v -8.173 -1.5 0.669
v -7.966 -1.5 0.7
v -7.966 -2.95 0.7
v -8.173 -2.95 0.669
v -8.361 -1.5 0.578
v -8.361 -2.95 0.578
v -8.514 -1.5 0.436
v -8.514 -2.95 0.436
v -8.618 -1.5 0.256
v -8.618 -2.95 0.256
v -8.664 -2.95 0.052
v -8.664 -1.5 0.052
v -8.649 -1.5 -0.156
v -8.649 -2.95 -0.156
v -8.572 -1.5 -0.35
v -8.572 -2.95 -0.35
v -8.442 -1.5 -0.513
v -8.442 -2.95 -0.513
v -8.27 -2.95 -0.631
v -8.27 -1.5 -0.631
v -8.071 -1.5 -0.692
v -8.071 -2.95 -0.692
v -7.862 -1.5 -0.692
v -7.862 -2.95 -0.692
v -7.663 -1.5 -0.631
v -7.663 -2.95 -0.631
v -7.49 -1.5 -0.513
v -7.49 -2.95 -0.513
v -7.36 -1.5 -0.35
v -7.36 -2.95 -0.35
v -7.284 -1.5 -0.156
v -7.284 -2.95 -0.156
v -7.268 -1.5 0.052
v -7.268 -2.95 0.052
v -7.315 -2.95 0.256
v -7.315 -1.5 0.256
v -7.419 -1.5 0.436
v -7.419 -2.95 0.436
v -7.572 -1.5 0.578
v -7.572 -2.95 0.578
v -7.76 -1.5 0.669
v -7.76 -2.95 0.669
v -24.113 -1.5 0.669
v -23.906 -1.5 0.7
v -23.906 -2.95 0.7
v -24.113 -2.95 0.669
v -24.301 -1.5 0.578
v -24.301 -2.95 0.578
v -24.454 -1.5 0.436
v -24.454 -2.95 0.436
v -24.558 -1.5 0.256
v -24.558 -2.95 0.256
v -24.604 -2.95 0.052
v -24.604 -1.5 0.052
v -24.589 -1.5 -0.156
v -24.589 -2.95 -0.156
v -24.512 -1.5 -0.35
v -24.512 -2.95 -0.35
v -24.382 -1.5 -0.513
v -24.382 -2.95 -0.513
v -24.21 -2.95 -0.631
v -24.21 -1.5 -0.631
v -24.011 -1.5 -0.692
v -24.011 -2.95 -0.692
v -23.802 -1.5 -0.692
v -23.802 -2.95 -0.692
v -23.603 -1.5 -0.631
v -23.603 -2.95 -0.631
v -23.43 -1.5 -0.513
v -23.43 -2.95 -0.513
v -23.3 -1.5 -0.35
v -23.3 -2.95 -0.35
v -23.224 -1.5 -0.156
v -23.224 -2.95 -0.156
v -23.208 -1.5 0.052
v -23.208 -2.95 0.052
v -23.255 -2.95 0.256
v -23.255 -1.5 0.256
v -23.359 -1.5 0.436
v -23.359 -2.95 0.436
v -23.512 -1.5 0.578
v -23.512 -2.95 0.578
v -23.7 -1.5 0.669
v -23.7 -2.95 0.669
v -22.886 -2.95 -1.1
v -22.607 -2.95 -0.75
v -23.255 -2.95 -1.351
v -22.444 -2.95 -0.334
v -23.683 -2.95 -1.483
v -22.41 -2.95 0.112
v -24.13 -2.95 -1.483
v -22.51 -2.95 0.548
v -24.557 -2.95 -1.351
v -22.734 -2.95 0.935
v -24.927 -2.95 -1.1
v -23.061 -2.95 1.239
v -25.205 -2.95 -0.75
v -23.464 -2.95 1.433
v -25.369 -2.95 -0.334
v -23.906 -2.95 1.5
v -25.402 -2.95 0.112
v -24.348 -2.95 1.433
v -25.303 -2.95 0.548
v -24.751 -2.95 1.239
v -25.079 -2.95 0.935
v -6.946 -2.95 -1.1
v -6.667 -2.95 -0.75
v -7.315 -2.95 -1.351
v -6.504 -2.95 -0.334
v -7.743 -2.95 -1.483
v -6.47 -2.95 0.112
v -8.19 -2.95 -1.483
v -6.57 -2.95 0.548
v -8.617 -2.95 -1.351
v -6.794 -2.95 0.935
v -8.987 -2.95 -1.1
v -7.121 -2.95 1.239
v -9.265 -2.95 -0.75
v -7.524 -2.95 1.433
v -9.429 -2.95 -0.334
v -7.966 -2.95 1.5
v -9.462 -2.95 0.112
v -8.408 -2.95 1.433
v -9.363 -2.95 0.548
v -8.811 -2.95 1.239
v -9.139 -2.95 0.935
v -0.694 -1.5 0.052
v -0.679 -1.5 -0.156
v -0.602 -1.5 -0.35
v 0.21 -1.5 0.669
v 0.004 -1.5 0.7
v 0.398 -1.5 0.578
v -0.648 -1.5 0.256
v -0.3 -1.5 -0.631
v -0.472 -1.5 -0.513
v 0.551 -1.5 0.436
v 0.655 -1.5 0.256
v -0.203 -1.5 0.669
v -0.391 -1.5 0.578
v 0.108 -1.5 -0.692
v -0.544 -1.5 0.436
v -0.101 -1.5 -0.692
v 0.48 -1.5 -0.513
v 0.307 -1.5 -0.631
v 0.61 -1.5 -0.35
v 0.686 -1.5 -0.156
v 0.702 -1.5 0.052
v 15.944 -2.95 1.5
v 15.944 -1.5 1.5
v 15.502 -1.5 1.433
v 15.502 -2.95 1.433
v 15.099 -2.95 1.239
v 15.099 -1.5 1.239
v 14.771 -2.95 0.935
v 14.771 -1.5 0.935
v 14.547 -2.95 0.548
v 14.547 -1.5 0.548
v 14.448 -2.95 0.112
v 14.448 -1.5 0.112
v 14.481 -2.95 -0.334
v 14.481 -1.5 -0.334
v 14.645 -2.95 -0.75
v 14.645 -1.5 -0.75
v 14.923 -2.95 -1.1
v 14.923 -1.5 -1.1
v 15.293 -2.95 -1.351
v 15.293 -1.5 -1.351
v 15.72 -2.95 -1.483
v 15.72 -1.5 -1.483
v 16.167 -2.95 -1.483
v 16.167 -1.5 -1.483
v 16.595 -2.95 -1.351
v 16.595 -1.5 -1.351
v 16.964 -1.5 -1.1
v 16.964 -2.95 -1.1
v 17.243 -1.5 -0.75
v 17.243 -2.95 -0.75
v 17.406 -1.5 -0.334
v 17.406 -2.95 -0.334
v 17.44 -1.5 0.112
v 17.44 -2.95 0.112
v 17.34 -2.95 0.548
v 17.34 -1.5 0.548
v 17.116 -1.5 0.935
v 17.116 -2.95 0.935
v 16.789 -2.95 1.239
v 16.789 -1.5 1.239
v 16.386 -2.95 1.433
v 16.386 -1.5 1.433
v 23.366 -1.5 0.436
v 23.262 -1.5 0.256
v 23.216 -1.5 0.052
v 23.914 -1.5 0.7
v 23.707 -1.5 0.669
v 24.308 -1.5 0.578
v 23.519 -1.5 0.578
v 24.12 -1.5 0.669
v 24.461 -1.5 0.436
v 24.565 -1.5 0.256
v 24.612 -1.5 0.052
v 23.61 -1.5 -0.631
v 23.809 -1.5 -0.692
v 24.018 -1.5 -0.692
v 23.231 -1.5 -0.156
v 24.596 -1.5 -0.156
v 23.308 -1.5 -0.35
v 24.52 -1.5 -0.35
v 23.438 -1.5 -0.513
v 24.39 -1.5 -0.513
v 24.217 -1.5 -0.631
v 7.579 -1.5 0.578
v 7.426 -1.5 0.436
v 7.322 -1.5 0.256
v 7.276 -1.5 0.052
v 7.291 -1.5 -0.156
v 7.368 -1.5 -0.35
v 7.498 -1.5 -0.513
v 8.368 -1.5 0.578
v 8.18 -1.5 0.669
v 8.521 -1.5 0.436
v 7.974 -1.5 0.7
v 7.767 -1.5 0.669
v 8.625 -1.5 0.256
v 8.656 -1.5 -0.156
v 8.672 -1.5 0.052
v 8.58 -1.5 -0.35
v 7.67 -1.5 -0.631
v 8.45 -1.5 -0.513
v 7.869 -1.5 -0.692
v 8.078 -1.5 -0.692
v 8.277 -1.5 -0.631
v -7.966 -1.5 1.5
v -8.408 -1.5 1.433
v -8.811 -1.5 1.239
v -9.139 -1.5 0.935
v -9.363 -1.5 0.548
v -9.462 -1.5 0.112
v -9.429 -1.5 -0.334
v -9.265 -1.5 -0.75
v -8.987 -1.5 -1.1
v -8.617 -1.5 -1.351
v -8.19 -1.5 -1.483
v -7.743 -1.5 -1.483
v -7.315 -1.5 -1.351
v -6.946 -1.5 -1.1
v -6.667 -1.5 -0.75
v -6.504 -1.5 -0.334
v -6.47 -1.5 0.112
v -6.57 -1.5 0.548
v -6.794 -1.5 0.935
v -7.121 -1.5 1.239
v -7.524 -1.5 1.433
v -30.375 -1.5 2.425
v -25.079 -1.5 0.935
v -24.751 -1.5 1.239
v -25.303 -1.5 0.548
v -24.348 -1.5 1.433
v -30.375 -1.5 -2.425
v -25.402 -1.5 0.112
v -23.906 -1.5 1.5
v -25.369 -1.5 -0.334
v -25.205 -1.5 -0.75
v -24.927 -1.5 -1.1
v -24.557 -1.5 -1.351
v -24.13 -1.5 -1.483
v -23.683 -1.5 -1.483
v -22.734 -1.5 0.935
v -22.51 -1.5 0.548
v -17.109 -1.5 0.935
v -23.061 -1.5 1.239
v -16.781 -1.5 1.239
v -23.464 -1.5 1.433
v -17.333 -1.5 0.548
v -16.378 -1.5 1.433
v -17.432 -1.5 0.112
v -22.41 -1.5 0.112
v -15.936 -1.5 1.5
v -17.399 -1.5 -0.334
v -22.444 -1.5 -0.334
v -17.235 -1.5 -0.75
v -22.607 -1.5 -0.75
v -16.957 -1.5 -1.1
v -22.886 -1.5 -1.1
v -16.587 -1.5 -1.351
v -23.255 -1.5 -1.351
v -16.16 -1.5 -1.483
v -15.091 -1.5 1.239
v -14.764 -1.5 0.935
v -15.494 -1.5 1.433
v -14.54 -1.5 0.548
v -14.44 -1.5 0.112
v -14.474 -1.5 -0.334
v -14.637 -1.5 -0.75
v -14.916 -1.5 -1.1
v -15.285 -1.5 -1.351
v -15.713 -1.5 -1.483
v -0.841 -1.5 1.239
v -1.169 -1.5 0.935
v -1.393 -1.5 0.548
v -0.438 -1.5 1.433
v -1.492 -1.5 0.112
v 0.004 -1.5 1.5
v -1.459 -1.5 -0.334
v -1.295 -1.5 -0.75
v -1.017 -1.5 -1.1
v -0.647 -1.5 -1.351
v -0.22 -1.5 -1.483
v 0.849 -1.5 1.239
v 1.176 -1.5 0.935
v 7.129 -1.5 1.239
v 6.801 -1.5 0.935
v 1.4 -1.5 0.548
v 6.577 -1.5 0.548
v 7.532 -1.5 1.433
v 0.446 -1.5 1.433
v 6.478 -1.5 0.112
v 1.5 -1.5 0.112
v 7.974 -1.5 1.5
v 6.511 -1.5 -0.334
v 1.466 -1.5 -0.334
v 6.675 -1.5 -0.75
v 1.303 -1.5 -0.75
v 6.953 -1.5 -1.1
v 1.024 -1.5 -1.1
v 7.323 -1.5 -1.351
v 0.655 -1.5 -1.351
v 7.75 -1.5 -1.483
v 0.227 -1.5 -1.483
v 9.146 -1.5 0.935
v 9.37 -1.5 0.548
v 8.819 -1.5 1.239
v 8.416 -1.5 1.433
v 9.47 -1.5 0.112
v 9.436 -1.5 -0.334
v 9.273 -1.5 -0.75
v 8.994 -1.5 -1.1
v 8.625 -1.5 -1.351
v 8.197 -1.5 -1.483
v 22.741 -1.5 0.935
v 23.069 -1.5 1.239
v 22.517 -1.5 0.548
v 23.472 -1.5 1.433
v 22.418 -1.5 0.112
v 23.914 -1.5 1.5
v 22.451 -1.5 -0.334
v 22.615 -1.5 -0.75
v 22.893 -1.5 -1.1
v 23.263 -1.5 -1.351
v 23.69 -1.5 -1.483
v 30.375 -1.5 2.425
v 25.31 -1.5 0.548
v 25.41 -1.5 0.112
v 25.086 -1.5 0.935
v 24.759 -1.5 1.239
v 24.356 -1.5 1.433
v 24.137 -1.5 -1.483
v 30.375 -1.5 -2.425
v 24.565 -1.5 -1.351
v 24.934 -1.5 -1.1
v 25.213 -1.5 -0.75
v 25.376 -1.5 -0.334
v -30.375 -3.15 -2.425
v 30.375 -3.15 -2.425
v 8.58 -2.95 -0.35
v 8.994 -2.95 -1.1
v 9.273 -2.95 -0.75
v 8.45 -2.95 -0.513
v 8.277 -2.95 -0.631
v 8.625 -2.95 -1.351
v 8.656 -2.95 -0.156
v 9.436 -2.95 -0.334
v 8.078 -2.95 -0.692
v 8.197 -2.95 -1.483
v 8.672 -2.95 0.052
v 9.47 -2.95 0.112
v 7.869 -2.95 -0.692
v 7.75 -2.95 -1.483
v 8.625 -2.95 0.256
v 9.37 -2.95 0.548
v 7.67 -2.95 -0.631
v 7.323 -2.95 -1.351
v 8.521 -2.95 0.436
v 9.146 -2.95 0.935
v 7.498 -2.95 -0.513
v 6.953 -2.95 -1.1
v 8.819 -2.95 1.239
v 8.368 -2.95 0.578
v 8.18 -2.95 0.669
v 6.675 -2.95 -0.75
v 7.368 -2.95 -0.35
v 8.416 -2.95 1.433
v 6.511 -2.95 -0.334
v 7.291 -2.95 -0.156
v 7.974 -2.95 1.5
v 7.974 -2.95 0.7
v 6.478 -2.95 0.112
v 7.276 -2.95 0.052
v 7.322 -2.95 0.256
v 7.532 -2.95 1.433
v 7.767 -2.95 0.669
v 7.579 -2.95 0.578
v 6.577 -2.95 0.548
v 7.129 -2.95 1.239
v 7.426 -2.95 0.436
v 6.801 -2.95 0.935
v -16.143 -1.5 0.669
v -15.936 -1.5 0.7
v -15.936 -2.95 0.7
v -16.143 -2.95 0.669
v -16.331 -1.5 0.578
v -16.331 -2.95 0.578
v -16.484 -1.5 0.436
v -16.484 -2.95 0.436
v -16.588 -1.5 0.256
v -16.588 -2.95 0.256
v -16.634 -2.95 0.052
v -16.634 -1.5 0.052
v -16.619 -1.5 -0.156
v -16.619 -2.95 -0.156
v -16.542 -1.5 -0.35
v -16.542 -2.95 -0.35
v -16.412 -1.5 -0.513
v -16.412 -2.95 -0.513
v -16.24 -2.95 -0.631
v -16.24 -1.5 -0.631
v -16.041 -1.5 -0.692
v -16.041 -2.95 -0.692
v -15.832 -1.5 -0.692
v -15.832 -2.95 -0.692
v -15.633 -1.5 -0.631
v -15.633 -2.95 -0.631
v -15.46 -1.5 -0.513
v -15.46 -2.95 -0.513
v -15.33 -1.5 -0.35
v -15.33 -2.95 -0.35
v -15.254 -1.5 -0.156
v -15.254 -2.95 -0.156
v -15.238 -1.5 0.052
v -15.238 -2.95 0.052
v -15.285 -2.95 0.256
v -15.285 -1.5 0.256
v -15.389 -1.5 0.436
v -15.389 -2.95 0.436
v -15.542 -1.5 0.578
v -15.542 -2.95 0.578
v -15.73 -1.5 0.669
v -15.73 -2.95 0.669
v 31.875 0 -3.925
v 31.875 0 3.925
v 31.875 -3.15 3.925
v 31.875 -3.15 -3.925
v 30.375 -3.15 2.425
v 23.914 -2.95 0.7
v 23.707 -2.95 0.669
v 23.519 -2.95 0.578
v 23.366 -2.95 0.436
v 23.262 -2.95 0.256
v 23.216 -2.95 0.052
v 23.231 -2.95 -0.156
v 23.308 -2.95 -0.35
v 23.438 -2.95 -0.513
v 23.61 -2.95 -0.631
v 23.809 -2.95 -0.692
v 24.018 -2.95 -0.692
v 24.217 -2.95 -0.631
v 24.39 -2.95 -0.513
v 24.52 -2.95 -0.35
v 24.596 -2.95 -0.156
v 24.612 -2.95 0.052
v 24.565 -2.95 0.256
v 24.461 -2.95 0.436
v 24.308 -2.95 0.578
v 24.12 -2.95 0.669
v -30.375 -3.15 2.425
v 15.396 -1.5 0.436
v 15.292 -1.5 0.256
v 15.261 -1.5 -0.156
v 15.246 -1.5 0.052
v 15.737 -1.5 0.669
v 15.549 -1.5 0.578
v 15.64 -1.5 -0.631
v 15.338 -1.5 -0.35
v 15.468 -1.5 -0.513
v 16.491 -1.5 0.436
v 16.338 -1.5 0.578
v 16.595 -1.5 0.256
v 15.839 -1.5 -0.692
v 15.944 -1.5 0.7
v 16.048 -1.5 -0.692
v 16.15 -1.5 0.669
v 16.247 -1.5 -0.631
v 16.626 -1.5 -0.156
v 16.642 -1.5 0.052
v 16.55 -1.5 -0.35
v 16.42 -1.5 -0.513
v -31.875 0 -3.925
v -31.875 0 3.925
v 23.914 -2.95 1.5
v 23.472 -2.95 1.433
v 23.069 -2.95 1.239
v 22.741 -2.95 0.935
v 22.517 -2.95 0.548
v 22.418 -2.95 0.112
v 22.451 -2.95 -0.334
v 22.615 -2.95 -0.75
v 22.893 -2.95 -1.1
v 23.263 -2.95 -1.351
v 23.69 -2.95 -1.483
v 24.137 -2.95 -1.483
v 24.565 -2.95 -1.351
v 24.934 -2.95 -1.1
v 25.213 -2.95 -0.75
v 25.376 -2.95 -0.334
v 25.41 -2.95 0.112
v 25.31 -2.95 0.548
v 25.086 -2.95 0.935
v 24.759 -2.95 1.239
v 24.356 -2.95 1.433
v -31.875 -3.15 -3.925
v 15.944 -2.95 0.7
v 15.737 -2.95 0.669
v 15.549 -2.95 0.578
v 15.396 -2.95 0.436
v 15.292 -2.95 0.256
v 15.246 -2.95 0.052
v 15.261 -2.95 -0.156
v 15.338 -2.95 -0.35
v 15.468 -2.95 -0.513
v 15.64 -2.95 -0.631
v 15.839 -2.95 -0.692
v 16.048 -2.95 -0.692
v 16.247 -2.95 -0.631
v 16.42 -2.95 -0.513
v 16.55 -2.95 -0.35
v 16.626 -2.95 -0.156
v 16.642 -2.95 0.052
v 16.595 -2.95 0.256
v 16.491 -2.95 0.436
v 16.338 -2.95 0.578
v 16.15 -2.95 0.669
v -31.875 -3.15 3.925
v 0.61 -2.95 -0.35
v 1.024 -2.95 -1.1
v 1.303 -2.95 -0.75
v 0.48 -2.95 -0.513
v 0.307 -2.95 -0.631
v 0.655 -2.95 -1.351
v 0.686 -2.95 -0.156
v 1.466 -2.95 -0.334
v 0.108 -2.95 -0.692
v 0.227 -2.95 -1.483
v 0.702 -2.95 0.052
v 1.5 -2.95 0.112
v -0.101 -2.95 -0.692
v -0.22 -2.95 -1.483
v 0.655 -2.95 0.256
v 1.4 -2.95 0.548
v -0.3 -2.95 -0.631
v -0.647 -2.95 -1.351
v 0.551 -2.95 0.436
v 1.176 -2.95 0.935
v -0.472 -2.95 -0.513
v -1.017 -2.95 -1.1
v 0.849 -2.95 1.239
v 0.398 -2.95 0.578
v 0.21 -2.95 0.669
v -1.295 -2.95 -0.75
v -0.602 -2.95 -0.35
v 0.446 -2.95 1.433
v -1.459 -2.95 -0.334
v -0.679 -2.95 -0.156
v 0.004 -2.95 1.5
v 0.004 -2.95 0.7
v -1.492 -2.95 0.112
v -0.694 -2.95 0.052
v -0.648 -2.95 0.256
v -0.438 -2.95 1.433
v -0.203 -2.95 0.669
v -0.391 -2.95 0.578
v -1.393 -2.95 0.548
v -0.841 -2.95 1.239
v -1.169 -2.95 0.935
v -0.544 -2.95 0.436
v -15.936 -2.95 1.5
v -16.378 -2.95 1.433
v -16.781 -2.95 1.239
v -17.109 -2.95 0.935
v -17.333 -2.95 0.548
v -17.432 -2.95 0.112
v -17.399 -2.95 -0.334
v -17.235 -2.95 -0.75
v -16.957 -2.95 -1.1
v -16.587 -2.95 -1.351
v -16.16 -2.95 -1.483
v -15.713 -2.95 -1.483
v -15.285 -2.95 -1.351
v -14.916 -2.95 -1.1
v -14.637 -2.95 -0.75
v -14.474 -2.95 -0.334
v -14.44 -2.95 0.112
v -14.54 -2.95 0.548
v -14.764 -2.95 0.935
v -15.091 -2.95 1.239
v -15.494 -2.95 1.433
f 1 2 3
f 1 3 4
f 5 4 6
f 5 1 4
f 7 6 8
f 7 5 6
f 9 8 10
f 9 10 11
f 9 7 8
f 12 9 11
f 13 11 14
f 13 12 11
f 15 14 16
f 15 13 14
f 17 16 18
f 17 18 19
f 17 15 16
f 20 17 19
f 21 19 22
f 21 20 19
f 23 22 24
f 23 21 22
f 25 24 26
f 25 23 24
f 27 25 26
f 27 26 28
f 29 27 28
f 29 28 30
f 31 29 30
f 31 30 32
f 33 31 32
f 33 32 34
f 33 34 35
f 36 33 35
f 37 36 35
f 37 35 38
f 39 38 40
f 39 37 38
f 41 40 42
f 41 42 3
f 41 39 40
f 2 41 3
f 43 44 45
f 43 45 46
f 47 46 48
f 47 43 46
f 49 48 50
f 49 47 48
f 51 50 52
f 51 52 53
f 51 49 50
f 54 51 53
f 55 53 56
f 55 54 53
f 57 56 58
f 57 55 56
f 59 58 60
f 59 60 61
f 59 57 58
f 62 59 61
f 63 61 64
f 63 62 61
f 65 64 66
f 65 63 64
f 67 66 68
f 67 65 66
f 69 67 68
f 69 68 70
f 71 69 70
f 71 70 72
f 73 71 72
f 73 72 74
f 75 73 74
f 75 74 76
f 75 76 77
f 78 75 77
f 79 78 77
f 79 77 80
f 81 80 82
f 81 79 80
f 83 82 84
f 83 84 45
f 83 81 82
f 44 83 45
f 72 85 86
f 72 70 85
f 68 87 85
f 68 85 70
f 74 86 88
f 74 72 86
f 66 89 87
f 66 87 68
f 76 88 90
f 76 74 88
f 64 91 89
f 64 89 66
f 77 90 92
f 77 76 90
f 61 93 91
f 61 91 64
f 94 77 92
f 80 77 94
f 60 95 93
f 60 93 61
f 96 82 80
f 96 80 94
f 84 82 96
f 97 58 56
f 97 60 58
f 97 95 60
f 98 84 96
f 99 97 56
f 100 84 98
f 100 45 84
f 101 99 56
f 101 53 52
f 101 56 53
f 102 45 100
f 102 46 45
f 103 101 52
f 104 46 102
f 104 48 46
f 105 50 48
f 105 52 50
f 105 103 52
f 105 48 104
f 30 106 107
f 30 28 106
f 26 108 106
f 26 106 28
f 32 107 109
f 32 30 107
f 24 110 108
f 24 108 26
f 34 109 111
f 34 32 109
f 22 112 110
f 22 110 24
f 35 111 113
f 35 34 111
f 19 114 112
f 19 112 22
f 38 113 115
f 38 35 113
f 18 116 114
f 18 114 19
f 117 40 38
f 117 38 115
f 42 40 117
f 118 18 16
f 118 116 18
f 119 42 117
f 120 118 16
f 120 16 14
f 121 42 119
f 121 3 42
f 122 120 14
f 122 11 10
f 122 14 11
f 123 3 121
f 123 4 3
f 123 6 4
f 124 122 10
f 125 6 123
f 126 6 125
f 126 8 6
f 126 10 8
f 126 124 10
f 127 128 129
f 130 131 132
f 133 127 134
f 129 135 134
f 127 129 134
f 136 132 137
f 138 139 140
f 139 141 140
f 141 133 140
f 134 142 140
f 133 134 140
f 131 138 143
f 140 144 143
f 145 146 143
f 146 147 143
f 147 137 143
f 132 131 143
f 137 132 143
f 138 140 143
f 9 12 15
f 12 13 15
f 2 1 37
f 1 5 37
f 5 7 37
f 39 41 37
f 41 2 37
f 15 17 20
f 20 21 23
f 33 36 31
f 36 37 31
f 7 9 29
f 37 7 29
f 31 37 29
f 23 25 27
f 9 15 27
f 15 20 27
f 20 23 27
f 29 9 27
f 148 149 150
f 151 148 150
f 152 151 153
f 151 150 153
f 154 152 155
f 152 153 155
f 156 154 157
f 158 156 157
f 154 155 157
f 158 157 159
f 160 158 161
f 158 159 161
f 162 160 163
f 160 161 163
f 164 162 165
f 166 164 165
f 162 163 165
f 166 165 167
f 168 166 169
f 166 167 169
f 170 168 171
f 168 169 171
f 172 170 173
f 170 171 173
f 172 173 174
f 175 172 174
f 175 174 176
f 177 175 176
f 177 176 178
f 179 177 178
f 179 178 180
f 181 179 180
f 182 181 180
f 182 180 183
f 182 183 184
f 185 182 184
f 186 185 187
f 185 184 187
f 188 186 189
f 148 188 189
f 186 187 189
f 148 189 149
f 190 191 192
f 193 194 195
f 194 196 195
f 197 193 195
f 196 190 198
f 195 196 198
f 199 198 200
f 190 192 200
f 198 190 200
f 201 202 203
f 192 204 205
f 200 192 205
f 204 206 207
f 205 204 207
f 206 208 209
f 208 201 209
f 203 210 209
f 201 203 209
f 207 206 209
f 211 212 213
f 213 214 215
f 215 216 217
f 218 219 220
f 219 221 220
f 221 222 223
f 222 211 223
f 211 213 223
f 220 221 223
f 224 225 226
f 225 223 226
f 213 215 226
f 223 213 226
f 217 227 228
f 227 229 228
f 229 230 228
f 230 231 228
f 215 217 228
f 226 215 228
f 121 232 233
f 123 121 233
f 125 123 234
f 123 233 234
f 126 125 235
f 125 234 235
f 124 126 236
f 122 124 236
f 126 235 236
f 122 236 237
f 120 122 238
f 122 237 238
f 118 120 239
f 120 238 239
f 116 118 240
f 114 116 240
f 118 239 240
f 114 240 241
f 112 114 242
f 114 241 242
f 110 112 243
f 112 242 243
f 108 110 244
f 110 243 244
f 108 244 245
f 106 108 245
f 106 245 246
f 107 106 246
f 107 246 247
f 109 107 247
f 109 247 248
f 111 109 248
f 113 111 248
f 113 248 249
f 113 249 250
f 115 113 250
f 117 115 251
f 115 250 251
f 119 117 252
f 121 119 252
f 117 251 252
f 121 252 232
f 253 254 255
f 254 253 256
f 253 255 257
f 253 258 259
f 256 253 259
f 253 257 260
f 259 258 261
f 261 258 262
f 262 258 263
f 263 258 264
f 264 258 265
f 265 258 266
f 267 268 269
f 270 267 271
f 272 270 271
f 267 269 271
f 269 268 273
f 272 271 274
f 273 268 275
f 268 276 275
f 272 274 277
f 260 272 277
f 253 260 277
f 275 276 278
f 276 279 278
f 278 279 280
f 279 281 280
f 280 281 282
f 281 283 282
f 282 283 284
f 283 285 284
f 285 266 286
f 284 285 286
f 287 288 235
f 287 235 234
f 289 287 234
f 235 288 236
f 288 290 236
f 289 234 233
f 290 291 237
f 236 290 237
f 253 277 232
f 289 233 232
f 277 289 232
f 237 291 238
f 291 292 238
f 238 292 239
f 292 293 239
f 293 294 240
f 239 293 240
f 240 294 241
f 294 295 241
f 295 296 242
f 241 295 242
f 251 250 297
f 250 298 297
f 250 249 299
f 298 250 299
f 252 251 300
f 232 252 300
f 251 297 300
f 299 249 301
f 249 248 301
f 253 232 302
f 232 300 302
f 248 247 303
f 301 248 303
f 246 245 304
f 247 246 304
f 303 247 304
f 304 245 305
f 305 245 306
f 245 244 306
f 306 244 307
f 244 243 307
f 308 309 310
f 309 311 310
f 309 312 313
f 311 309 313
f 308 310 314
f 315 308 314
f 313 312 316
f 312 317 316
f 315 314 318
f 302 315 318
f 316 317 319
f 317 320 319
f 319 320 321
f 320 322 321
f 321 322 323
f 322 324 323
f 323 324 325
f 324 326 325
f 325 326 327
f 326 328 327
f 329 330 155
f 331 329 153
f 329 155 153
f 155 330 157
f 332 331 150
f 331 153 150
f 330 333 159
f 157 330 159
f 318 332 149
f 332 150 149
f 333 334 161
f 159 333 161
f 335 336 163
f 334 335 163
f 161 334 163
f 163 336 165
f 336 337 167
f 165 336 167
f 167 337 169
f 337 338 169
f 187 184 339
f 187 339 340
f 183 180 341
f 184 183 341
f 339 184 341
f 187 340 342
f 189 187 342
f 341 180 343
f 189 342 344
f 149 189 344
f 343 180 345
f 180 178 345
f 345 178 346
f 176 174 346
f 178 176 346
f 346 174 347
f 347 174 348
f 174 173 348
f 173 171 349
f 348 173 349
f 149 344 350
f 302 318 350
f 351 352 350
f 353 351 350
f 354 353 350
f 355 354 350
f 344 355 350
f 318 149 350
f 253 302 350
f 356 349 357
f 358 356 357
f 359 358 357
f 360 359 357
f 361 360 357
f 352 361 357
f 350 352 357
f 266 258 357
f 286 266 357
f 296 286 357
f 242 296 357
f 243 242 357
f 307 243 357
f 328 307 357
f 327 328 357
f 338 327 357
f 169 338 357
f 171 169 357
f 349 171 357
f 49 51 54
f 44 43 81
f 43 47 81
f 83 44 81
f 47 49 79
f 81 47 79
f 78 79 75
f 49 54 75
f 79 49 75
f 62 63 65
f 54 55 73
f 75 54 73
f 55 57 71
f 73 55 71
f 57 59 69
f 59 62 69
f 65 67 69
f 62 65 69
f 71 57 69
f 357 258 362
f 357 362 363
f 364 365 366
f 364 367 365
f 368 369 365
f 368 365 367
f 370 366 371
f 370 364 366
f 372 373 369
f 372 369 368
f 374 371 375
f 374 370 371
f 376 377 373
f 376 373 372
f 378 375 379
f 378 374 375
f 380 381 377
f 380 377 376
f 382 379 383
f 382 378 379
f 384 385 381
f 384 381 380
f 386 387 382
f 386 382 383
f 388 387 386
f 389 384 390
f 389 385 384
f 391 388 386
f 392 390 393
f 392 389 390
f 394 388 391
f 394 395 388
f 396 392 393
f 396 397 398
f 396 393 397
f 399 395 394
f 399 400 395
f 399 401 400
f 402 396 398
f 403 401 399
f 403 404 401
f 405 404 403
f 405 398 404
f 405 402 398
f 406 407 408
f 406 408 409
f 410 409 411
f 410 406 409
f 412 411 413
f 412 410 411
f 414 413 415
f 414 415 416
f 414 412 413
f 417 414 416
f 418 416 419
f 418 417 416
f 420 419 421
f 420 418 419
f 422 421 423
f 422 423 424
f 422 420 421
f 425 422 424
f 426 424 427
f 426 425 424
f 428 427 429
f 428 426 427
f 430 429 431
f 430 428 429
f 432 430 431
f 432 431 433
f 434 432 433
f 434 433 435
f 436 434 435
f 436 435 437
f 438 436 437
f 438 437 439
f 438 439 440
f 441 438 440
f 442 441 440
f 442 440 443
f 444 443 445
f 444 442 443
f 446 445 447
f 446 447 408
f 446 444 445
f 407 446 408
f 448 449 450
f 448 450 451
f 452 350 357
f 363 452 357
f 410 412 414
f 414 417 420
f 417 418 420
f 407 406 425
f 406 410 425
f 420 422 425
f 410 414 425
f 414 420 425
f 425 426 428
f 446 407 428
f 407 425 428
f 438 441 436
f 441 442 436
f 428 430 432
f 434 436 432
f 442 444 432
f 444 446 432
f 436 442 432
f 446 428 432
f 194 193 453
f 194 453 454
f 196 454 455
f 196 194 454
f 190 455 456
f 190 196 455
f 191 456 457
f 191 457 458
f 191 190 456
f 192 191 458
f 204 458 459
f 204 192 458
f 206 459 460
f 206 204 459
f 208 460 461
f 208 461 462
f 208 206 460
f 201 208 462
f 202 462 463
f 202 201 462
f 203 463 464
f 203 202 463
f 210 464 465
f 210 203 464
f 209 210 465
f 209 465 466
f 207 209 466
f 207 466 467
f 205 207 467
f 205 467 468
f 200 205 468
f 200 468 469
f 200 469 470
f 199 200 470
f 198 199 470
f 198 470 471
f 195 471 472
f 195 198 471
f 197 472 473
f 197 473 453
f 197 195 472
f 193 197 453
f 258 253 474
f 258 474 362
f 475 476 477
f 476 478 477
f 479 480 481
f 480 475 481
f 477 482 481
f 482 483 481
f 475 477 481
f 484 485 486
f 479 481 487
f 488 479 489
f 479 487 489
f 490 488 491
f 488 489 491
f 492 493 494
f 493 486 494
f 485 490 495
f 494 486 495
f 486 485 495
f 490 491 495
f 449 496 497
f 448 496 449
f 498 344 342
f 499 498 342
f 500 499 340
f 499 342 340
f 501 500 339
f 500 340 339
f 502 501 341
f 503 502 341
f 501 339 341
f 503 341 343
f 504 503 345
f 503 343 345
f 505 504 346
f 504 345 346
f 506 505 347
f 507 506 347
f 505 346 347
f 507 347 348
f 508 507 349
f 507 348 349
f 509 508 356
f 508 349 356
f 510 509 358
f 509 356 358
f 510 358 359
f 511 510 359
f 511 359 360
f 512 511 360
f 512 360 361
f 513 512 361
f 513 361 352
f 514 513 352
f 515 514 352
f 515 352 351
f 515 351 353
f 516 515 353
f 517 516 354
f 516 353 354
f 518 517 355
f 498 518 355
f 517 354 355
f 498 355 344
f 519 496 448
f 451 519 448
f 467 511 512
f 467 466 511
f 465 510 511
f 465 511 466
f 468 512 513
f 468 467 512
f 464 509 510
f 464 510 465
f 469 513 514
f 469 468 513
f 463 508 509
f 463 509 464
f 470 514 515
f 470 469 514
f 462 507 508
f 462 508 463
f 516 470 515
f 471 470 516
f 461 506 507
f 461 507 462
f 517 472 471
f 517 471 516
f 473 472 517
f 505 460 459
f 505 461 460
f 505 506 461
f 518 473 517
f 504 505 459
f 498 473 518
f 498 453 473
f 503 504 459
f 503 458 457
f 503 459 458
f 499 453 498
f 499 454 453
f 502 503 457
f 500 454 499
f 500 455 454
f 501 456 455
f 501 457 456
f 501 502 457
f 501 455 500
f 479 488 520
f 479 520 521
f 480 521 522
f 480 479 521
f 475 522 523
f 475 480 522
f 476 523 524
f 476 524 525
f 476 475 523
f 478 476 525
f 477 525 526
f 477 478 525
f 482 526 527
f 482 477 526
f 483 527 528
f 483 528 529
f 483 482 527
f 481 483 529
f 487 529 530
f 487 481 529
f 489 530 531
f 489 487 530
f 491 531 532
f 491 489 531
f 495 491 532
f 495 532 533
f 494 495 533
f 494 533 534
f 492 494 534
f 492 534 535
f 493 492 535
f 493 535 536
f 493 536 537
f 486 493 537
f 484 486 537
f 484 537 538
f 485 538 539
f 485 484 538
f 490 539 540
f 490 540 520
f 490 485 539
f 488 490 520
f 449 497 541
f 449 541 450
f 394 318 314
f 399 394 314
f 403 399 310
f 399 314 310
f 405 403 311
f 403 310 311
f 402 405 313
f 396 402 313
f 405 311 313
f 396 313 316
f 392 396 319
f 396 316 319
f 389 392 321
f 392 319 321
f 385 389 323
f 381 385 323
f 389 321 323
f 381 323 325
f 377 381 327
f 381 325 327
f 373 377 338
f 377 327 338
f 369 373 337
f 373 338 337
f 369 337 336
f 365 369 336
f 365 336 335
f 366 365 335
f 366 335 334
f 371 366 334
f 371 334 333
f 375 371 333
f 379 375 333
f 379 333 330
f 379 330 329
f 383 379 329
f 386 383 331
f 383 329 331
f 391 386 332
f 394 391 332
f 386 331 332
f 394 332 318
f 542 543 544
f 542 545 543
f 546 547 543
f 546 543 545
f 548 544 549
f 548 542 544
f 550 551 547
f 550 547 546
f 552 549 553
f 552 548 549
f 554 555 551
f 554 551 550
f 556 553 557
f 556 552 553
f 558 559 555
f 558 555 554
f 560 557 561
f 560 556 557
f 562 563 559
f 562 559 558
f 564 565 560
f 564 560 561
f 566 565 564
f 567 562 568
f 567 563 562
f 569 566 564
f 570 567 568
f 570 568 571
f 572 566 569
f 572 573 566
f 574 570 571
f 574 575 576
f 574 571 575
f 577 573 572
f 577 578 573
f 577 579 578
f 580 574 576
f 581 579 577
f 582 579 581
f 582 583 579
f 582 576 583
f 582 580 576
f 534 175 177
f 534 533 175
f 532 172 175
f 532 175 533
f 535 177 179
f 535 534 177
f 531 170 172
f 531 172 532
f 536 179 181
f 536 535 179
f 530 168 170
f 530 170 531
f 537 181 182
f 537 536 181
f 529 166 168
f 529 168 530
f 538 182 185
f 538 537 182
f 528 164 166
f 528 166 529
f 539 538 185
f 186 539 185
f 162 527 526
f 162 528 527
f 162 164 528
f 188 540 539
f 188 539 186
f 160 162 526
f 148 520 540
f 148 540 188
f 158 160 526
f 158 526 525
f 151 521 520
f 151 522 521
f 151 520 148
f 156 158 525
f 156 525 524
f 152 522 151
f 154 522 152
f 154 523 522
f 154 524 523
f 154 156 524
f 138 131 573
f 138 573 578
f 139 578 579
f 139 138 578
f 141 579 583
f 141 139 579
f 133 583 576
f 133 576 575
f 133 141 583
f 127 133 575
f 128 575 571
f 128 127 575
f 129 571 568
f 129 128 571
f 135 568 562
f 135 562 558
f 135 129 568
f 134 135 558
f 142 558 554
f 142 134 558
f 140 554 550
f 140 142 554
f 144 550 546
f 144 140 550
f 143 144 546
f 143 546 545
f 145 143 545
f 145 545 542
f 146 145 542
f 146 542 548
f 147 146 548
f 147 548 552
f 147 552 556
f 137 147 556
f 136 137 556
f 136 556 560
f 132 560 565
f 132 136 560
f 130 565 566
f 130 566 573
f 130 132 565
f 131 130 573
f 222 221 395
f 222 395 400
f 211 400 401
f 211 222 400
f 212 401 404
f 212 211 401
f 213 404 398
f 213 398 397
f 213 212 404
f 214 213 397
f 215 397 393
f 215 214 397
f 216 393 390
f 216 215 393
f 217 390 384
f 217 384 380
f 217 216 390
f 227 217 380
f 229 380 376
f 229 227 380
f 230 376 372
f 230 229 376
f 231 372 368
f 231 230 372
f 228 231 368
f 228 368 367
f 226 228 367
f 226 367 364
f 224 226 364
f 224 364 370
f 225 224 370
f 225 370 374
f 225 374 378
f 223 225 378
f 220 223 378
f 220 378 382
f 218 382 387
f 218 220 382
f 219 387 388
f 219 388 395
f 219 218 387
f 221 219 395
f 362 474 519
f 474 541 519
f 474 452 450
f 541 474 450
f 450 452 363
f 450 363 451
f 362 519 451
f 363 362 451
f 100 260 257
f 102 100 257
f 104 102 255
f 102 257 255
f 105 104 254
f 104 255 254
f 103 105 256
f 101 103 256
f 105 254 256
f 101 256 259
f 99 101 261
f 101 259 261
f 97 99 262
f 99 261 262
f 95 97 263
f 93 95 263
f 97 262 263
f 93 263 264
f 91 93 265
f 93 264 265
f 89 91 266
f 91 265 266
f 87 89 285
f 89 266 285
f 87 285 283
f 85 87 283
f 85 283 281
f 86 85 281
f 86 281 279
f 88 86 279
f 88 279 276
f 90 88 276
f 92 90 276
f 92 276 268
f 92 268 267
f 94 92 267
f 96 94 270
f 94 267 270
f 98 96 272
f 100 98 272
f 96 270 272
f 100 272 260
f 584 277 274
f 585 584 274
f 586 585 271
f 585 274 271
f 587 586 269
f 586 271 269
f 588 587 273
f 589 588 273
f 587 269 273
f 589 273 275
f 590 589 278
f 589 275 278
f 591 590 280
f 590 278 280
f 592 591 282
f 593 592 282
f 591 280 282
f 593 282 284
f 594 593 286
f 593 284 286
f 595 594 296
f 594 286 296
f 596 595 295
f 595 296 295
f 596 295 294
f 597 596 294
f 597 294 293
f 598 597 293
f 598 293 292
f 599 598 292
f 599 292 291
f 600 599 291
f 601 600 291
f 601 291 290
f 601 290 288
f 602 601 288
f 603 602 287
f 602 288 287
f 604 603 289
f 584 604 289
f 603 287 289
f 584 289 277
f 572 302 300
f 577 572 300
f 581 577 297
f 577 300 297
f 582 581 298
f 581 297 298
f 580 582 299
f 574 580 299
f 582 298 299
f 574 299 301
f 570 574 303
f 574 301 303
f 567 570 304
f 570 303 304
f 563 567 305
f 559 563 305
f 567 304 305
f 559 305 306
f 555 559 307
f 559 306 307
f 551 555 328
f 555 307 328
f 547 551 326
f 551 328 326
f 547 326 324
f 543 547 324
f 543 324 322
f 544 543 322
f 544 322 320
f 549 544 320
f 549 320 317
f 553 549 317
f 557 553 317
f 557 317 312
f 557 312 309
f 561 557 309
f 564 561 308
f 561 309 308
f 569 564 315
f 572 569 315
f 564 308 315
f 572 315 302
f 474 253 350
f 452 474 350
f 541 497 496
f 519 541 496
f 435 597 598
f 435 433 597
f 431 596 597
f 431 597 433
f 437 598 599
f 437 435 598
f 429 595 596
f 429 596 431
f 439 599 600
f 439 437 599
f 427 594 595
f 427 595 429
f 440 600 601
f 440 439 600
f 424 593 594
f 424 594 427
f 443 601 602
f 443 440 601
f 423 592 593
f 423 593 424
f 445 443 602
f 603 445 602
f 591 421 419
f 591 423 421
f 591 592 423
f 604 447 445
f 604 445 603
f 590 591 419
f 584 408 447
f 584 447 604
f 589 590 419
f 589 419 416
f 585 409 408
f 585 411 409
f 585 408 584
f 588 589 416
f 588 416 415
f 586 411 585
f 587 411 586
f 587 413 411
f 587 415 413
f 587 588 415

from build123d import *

# Parameters (mm, degrees)
SKETCH1_W           = 63.75
SKETCH1_H           = 7.85
BOSS_EXTRUDE1_DEPTH = 3.15
SHELL1_T            = -1.5
SKETCH2_R           = 1.5
SKETCH2_R_2         = 0.7
BOSS_EXTRUDE2_DEPTH = 1.45


with BuildPart() as part:
    # Sketch1 → Boss-Extrude1 (new body)
    with BuildSketch(Plane(origin=(0, 0, 0), x_dir=(1, 0, 0), z_dir=(0, 1, 0))):
        Rectangle(SKETCH1_W, SKETCH1_H)
    extrude(amount=-BOSS_EXTRUDE1_DEPTH)

    # Shell1
    shell1_openings = [part.faces().sort_by_distance(p)[0] for p in [
        (0, -3.15, 0),
    ]]
    offset(amount=SHELL1_T, openings=shell1_openings, kind=Kind.INTERSECTION)

    # Sketch2 → Boss-Extrude2 (add)
    # profile 1 of 7: a face of its own
    with BuildSketch(Plane.XZ.offset(1.5)):
        with Locations(Location((-23.90625, 0, 0), (0, 0, 90))):
            Circle(SKETCH2_R)
        with Locations(Location((-23.90625, 0, 0), (0, 0, 90))):
            Circle(SKETCH2_R_2, mode=Mode.SUBTRACT)
    # profile 2 of 7: a face of its own
    with BuildSketch(Plane.XZ.offset(1.5)):
        with Locations(Location((-15.93625, 0, 0), (0, 0, 90))):
            Circle(SKETCH2_R)
        with Locations(Location((-15.93625, 0, 0), (0, 0, 90))):
            Circle(SKETCH2_R_2, mode=Mode.SUBTRACT)
    # profile 3 of 7: a face of its own
    with BuildSketch(Plane.XZ.offset(1.5)):
        with Locations(Location((-7.96625, 0, 0), (0, 0, 90))):
            Circle(SKETCH2_R)
        with Locations(Location((-7.96625, 0, 0), (0, 0, 90))):
            Circle(SKETCH2_R_2, mode=Mode.SUBTRACT)
    # profile 4 of 7: a face of its own
    with BuildSketch(Plane.XZ.offset(1.5)):
        with Locations(Location((0.00375, 0, 0), (0, 0, 90))):
            Circle(SKETCH2_R)
        with Locations(Location((0.00375, 0, 0), (0, 0, 90))):
            Circle(SKETCH2_R_2, mode=Mode.SUBTRACT)
    # profile 5 of 7: a face of its own
    with BuildSketch(Plane.XZ.offset(1.5)):
        with Locations(Location((7.97375, 0, 0), (0, 0, 90))):
            Circle(SKETCH2_R)
        with Locations(Location((7.97375, 0, 0), (0, 0, 90))):
            Circle(SKETCH2_R_2, mode=Mode.SUBTRACT)
    # profile 6 of 7: a face of its own
    with BuildSketch(Plane.XZ.offset(1.5)):
        with Locations(Location((15.94375, 0, 0), (0, 0, 90))):
            Circle(SKETCH2_R)
        with Locations(Location((15.94375, 0, 0), (0, 0, 90))):
            Circle(SKETCH2_R_2, mode=Mode.SUBTRACT)
    # profile 7 of 7: a face of its own
    with BuildSketch(Plane.XZ.offset(1.5)):
        with Locations(Location((23.91375, 0, 0), (0, 0, 90))):
            Circle(SKETCH2_R)
        with Locations(Location((23.91375, 0, 0), (0, 0, 90))):
            Circle(SKETCH2_R_2, mode=Mode.SUBTRACT)
    extrude(amount=BOSS_EXTRUDE2_DEPTH)


solid = part.part
